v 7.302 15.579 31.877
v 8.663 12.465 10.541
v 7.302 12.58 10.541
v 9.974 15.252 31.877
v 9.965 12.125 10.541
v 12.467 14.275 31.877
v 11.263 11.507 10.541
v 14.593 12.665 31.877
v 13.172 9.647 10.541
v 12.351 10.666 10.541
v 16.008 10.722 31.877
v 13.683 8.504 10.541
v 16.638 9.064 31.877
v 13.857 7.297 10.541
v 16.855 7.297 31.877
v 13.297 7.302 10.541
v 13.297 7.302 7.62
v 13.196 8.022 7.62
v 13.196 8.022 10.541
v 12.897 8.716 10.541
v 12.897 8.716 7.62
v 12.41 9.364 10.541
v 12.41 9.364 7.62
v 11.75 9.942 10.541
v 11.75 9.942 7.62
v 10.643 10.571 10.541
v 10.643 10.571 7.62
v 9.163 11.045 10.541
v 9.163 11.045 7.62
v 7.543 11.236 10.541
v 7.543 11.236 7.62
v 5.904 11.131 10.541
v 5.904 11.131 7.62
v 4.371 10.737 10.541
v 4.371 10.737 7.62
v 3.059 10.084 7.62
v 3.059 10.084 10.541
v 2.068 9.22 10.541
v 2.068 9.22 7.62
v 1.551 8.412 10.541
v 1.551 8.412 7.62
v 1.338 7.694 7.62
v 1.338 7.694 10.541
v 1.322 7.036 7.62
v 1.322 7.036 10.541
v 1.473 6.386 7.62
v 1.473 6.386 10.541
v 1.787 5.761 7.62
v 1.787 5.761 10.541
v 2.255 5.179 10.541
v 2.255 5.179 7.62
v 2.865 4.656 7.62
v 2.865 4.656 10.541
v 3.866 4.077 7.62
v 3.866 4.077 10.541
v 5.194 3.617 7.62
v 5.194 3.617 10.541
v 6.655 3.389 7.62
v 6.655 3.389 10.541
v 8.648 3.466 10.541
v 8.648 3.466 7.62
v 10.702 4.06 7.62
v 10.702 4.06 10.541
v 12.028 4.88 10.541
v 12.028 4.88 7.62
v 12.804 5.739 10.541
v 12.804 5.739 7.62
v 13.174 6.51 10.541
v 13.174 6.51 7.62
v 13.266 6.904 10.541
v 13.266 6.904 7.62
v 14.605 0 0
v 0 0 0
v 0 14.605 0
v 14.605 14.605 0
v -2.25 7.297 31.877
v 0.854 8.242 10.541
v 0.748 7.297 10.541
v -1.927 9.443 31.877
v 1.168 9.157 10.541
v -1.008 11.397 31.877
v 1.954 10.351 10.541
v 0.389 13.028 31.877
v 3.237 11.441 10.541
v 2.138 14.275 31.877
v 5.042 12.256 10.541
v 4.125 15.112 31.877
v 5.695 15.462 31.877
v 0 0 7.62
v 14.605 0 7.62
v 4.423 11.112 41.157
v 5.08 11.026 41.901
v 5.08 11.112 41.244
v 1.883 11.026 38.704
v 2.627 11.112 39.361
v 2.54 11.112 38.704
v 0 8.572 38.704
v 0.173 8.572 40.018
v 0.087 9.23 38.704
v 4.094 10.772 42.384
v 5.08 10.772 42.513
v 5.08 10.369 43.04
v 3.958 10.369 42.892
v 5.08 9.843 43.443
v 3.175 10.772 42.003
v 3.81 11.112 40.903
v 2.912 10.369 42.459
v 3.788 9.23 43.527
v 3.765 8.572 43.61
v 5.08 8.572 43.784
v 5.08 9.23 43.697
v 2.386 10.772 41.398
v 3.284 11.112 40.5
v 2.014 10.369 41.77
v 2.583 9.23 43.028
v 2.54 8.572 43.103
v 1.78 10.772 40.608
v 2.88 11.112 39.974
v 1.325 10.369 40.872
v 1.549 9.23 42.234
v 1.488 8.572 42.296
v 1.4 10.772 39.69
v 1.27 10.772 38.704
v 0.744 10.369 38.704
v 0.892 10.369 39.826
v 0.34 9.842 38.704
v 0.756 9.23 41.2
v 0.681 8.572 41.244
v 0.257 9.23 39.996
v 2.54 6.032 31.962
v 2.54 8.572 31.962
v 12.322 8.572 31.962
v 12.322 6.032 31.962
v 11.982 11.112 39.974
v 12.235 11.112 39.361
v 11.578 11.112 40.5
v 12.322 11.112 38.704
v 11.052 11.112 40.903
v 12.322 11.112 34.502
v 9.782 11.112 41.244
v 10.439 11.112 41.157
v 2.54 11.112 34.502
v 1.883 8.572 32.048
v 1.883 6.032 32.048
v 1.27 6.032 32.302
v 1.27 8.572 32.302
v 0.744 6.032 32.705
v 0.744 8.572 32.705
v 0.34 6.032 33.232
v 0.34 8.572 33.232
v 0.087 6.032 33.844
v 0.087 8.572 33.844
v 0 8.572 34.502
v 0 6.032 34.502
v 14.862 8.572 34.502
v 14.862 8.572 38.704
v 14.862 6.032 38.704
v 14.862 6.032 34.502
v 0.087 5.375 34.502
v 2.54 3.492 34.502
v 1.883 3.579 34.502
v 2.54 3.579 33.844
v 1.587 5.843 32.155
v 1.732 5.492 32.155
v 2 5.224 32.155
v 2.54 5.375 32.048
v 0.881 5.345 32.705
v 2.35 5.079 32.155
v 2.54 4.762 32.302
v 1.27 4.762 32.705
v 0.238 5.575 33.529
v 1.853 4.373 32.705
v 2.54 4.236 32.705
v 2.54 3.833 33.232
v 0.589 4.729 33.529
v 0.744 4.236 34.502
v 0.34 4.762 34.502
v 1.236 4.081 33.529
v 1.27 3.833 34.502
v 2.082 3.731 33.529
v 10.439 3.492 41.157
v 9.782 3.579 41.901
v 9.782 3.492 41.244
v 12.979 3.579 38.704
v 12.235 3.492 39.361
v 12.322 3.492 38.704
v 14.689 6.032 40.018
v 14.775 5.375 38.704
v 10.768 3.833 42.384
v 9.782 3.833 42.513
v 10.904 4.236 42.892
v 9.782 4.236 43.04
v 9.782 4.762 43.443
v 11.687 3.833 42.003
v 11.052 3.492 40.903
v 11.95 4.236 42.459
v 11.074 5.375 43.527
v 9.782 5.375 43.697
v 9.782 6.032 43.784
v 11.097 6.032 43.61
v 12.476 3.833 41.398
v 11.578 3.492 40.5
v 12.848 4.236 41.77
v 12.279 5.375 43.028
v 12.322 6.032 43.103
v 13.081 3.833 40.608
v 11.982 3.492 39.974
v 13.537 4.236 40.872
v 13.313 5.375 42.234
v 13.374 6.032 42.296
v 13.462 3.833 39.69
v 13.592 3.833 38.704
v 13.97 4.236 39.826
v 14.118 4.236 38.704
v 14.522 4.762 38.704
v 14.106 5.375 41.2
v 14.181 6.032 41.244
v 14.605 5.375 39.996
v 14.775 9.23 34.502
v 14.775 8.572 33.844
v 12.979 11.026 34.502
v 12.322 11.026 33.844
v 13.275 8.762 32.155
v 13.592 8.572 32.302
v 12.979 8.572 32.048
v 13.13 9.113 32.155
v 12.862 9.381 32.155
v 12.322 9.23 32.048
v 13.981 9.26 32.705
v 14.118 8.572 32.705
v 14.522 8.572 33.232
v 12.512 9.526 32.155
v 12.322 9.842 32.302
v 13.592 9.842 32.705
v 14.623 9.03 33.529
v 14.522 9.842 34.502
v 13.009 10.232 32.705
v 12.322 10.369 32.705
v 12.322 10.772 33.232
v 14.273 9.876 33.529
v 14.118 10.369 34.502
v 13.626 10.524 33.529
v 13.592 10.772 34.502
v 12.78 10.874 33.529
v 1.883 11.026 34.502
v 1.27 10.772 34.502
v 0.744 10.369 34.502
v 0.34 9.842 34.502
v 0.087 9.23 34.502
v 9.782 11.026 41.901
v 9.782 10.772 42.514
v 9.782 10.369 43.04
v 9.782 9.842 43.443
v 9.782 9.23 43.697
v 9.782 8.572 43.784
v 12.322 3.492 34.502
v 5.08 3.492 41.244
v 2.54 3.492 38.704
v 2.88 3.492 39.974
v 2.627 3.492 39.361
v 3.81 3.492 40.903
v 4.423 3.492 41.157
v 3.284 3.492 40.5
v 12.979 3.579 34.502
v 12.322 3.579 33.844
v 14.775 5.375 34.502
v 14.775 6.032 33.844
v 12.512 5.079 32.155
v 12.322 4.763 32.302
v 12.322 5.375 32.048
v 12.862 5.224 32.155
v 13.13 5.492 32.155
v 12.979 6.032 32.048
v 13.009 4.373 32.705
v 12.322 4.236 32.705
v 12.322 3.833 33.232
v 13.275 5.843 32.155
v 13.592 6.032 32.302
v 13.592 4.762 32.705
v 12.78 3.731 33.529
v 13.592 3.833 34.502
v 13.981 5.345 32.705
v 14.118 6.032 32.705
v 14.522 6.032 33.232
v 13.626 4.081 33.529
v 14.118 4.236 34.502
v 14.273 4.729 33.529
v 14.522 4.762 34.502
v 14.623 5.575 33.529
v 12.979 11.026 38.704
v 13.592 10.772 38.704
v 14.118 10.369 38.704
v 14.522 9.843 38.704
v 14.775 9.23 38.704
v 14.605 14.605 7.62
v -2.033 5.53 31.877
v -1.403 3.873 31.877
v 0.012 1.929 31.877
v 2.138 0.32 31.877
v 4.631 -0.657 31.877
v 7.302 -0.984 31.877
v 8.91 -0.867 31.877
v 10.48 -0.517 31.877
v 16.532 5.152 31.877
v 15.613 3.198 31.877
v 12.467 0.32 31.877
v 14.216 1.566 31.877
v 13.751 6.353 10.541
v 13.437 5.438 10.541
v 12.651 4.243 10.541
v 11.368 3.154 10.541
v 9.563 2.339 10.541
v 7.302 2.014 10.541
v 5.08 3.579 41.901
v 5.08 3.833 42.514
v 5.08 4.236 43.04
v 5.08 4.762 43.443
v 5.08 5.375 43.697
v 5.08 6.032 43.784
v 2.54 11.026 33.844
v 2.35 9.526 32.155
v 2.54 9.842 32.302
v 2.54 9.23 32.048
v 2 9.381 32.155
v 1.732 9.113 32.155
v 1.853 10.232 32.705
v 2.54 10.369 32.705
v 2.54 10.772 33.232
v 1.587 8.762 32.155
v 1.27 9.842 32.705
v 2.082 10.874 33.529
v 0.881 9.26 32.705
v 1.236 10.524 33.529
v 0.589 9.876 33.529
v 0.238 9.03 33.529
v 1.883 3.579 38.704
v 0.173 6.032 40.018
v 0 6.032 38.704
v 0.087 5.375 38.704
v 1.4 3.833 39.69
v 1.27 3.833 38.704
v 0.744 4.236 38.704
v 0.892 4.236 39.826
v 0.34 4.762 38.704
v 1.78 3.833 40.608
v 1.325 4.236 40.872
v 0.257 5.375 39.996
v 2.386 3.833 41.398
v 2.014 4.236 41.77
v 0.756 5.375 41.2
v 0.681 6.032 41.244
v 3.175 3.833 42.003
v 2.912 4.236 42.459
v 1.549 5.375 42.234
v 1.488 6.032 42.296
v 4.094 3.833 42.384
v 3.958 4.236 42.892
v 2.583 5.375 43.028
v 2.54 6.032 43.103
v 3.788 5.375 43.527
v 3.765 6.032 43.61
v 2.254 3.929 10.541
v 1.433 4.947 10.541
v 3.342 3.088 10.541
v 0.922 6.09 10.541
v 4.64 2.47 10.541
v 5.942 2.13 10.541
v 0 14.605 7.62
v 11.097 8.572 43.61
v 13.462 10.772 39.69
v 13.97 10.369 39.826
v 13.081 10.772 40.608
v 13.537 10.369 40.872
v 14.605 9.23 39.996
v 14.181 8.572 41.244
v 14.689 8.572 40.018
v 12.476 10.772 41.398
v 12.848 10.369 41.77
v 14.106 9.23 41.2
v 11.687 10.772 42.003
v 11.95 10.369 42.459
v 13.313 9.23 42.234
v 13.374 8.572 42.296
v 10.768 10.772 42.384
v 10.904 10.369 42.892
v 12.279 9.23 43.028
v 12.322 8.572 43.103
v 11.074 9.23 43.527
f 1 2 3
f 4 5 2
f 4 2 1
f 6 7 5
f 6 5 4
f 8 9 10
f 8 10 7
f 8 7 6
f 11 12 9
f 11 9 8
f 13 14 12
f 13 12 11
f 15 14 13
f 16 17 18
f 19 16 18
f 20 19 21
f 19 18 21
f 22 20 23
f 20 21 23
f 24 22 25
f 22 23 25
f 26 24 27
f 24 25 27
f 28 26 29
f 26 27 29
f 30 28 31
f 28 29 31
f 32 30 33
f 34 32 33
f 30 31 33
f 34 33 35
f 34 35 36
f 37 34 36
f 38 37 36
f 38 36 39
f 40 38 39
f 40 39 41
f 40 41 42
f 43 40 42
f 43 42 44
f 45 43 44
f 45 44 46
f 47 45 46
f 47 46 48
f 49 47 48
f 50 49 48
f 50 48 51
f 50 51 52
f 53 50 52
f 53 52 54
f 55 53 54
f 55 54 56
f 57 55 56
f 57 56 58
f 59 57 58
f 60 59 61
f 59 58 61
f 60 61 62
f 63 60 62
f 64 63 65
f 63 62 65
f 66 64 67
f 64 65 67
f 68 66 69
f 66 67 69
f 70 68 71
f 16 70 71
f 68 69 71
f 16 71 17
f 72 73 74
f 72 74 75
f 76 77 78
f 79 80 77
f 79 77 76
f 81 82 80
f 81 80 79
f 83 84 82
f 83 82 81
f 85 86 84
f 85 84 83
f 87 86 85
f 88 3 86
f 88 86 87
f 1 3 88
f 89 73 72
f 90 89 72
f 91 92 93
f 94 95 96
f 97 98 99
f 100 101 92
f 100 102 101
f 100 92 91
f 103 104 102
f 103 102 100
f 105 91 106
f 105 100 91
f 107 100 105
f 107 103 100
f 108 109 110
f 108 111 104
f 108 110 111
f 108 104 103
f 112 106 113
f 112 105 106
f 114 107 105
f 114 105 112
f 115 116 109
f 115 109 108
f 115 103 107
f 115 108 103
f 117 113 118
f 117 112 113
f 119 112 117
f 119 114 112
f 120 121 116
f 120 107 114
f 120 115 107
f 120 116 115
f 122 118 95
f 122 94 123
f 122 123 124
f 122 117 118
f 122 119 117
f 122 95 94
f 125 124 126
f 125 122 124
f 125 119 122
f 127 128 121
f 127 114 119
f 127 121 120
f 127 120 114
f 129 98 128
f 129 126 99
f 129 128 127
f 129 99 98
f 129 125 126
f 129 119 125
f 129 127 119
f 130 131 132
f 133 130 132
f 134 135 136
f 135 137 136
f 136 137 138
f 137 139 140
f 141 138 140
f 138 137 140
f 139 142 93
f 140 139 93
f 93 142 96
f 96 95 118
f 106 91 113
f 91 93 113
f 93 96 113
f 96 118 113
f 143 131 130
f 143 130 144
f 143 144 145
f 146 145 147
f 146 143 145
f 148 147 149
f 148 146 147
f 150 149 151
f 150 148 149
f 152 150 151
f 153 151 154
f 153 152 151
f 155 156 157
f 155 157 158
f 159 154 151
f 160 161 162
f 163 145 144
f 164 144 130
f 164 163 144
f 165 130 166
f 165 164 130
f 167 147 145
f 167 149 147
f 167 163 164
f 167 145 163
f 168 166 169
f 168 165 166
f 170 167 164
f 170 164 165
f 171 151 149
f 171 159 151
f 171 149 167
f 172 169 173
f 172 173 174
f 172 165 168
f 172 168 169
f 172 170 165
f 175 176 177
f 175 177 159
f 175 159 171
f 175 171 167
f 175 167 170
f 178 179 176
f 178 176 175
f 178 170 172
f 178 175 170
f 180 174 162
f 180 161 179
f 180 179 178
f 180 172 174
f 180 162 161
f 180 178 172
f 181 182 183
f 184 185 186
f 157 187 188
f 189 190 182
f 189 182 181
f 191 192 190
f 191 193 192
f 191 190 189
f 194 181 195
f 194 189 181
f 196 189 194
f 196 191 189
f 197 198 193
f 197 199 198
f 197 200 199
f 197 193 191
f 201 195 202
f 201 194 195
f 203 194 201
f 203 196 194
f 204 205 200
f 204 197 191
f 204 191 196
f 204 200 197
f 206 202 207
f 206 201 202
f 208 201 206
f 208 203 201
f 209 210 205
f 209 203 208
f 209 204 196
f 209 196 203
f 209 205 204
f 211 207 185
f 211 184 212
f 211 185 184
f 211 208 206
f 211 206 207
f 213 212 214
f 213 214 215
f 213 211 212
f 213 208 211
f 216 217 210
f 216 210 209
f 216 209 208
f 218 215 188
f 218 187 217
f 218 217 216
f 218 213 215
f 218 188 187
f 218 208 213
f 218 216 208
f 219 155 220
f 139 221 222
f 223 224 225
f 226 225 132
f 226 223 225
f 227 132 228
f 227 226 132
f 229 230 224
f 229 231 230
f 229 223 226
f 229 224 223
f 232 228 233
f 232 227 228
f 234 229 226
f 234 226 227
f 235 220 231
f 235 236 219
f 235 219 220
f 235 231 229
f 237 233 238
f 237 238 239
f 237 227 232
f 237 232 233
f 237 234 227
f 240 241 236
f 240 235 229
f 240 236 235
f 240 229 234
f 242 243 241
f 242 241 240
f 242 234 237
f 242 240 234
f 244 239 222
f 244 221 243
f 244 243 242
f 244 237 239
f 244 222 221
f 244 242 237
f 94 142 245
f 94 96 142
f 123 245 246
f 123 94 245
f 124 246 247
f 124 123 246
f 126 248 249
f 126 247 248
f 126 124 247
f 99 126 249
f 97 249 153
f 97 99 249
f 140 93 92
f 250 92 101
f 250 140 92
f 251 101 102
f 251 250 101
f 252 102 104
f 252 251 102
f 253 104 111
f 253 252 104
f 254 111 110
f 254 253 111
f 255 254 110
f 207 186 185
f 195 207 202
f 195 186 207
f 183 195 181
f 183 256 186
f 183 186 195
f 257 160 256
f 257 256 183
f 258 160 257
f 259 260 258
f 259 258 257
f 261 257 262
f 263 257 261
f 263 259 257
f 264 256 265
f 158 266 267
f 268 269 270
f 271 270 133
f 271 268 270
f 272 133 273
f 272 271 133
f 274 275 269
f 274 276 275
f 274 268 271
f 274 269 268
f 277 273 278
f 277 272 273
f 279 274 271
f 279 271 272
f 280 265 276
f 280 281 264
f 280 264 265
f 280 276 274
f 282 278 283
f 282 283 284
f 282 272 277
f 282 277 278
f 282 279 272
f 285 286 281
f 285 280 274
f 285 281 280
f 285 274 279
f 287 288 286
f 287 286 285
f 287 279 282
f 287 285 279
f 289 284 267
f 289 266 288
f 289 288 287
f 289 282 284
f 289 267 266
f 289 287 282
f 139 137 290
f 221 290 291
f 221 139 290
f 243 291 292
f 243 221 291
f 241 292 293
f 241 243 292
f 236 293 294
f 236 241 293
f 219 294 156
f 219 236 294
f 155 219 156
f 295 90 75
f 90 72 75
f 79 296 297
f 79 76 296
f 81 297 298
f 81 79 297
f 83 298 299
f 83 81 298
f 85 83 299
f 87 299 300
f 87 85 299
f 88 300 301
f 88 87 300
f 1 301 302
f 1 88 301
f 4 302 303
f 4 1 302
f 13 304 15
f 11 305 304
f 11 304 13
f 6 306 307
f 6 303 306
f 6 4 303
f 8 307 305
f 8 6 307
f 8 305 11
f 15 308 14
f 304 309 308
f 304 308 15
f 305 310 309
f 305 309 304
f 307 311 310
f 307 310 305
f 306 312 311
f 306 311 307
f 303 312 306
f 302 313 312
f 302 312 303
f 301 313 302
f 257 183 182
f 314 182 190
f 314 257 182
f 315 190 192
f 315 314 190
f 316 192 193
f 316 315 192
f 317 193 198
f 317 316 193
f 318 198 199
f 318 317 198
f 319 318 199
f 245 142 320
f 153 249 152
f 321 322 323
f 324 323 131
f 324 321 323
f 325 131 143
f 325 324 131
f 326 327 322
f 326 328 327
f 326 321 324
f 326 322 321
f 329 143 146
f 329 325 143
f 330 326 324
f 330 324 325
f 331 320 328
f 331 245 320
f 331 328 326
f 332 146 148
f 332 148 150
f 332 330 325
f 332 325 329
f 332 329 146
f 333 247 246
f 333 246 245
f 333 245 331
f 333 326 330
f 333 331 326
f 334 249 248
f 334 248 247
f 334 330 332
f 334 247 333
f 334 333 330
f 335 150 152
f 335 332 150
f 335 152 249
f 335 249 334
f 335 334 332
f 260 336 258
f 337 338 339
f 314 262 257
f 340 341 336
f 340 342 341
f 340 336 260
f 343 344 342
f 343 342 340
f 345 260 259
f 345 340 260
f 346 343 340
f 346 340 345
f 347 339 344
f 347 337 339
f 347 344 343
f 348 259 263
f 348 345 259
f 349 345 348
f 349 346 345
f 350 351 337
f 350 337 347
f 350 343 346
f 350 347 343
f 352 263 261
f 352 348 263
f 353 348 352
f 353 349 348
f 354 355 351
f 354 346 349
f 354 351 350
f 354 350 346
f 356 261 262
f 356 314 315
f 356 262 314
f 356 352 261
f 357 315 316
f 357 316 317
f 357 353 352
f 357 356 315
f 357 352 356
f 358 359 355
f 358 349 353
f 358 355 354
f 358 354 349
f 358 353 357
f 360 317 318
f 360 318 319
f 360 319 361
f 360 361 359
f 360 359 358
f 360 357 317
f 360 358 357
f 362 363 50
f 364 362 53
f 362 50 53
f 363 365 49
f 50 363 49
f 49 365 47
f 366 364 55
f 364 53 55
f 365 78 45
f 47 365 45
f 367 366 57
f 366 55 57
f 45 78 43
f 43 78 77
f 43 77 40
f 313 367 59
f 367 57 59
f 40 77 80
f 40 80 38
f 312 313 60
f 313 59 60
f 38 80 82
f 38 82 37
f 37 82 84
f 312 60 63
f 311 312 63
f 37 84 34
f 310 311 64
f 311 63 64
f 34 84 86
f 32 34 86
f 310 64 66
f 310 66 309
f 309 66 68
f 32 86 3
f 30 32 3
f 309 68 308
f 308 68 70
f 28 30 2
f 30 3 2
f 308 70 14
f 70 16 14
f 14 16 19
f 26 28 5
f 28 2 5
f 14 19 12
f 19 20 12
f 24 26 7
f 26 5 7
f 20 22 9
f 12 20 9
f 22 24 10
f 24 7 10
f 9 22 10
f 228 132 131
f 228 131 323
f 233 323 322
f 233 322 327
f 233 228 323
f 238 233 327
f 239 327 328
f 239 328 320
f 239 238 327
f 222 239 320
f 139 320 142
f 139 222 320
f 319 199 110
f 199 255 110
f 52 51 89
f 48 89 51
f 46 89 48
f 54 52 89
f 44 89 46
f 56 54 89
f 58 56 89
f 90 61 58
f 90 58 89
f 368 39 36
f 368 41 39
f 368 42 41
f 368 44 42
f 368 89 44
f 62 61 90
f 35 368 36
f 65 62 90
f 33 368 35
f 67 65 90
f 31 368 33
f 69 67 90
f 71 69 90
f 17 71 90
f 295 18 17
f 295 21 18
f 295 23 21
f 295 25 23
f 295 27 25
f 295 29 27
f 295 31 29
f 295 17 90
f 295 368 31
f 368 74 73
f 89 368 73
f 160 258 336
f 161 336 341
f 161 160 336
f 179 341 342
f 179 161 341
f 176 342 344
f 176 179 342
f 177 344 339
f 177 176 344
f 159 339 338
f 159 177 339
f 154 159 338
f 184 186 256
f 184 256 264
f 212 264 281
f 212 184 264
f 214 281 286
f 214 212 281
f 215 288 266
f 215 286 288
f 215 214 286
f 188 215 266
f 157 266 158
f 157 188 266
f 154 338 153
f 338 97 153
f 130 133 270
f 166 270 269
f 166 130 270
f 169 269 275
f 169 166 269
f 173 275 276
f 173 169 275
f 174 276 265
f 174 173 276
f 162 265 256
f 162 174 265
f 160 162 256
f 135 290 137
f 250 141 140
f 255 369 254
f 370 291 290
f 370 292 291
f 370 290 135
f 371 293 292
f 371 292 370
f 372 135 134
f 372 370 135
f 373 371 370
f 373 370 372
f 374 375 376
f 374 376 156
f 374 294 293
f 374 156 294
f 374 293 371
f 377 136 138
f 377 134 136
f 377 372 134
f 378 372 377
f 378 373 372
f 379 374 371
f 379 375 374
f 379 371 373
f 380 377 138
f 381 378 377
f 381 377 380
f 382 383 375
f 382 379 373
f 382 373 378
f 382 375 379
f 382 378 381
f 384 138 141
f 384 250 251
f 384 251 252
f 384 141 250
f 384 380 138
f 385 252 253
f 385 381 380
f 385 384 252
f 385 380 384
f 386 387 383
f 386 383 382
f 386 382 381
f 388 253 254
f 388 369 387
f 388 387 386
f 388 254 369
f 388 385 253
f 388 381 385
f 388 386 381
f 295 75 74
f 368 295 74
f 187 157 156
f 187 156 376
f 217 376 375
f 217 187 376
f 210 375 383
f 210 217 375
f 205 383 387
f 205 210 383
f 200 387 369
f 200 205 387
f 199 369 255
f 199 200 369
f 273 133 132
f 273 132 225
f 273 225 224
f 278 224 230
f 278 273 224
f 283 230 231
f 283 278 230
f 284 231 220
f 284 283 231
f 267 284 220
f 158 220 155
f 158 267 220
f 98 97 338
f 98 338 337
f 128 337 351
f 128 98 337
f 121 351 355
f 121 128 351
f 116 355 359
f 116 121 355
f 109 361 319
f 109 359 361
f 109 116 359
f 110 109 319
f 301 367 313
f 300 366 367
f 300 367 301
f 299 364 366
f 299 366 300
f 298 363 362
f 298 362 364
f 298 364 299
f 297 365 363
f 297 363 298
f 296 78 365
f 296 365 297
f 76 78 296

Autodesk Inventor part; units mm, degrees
ref_plane "YZ Plane" through (0, 0, 0) normal (1, 0, 0) x (0, 1, 0)
ref_plane "XZ Plane" through (0, 0, 0) normal (0, 1, 0) x (-1, 0, 0)
ref_plane "XY Plane" through (0, 0, 0) normal (0, 0, 1) x (1, 0, 0)
sketch "Sketch1" plane through (0, 0, 0) normal (0, 0, 1) x (1, 0, 0)
  line L0 (0, 0) -> (14.605, 0)
  line L1 (14.605, 0) -> (14.605, 14.605)
  line L2 (14.605, 14.605) -> (0, 14.605)
  line L3 (0, 14.605) -> (0, 0)
  dimension "d0" = 14.605
  dimension "d1" = 14.605
extrude "Extrusion1" add sketch "Sketch1" along normal blind 7.62
ref_plane "Work Plane1" through (0, 14.605, 7.62) normal (0, 0, 1) x (1, 0, 0)
sketch "Sketch2" plane through (0, 14.605, 7.62) normal (0, 0, 1) x (1, 0, 0)
  line L0 (14.605, 0) -> (0, 0) construction
  line L1 (0, 0) -> (7.3025, 0) construction
  line L2 (7.3025, 0) -> (14.605, 0) construction
  line L3 (7.3025, 0) -> (7.3025, -7.3025) construction
  ellipse E0 centre (7.3025, -7.3025) end of major axis (13.2969, -7.3025) minor radius 3.937
  point P0 (0, -14.605)
  dimension "d7" = 5.9944
  dimension "d8" = 3.937
  dimension "d4" = 7.3025
  dimension "d5" = 7.3025
  dimension "d6" = 7.3025
extrude "Extrusion2" add sketch "Sketch2" along normal blind 2.921
ref_plane "Work Plane2" through (0, 14.605, 10.541) normal (0, 0, 1) x (1, 0, 0)
sketch "Sketch3" plane through (0, 14.605, 10.541) normal (0, 0, 1) x (1, 0, 0)
  ellipse E0 centre (7.3025, -7.3076) end of major axis (13.8567, -7.3076) minor radius 5.2829
  ellipse E1 centre (7.3025, -7.3025) end of major axis (1.3081, -7.3025) minor radius 3.937 projected
  point P0 (0, -14.605)
  dimension "d12" = 0
extrude "Extrusion3" add sketch "Sketch3" along normal blind 21.336 draft 8 contours E0 | E1
sketch "Sketch4" plane through (0, 0, 0) normal (0, -1, 0) x (1, 0, 0)
  point P0 (0, 0)
sketch "Sketch5" plane through (0, 0, 0) normal (0, -1, 0) x (1, 0, 0)
  line L0 (14.605, 0) -> (0, 0) projected
ref_plane "Work Plane3" through (7.3025, 7.3025, 10.541) normal (0, -1, 0) x (0, 0, 1)
sketch "Sketch6" plane through (7.3025, 7.3025, 10.541) normal (0, -1, 0) x (0, 0, 1)
  point P0 (-10.541, 7.3025)
sketch "Sketch7" plane through (7.3025, 7.3025, 10.541) normal (0, -1, 0) x (0, 0, 1)
  point P0 (-10.541, 7.3025)
sketch "Sketch8" plane through (7.3025, 7.3025, 10.541) normal (0, -1, 0) x (0, 0, 1)
  line L0 (21.4205, -0.1285) -> (33.2425, -0.1285)
  line L1 (33.2425, -0.1285) -> (33.2425, 7.3025)
  line L2 (33.2425, 7.3025) -> (21.4205, 7.3025)
  line L3 (21.4205, 7.3025) -> (21.4205, -0.1285)
  line L4 (33.2425, -0.1285) -> (33.2425, -7.5594)
  line L5 (33.2425, -7.5594) -> (21.4205, -7.5594)
  line L6 (21.4205, -7.5594) -> (21.4205, -0.1285)
  point P0 (-10.541, 7.3025)
extrude "Extrusion4" add sketch "Sketch8" along normal mid plane 7.62
fillet "Fillet1" radius 5.08 1 edges at (0, 7.3025, 43.7835)
fillet "Fillet2" radius 5.08 1 edges at (14.8619, 7.3025, 43.7835)
fillet "Fillet3" radius 2.54 5 edges at (7.431, 3.4925, 43.7835) (1.4879, 3.4925, 42.2956) (0, 3.4925, 35.3325) (13.374, 3.4925, 42.2956) (14.8619, 3.4925, 35.3325)
fillet "Fillet4" radius 2.54 5 edges at (7.431, 11.1125, 43.7835) (13.374, 11.1125, 42.2956) (14.8619, 11.1125, 35.3325) (1.4879, 11.1125, 42.2956) (0, 11.1125, 35.3325)
fillet "Fillet5" radius 2.54 6 edges at (7.431, 11.1125, 31.9615) (0.7439, 10.3686, 31.9615) (0, 7.3025, 31.9615) (0.7439, 4.2364, 31.9615) (7.431, 3.4925, 31.9615) (14.8619, 7.3025, 31.9615)
properties part number "maleNT"
